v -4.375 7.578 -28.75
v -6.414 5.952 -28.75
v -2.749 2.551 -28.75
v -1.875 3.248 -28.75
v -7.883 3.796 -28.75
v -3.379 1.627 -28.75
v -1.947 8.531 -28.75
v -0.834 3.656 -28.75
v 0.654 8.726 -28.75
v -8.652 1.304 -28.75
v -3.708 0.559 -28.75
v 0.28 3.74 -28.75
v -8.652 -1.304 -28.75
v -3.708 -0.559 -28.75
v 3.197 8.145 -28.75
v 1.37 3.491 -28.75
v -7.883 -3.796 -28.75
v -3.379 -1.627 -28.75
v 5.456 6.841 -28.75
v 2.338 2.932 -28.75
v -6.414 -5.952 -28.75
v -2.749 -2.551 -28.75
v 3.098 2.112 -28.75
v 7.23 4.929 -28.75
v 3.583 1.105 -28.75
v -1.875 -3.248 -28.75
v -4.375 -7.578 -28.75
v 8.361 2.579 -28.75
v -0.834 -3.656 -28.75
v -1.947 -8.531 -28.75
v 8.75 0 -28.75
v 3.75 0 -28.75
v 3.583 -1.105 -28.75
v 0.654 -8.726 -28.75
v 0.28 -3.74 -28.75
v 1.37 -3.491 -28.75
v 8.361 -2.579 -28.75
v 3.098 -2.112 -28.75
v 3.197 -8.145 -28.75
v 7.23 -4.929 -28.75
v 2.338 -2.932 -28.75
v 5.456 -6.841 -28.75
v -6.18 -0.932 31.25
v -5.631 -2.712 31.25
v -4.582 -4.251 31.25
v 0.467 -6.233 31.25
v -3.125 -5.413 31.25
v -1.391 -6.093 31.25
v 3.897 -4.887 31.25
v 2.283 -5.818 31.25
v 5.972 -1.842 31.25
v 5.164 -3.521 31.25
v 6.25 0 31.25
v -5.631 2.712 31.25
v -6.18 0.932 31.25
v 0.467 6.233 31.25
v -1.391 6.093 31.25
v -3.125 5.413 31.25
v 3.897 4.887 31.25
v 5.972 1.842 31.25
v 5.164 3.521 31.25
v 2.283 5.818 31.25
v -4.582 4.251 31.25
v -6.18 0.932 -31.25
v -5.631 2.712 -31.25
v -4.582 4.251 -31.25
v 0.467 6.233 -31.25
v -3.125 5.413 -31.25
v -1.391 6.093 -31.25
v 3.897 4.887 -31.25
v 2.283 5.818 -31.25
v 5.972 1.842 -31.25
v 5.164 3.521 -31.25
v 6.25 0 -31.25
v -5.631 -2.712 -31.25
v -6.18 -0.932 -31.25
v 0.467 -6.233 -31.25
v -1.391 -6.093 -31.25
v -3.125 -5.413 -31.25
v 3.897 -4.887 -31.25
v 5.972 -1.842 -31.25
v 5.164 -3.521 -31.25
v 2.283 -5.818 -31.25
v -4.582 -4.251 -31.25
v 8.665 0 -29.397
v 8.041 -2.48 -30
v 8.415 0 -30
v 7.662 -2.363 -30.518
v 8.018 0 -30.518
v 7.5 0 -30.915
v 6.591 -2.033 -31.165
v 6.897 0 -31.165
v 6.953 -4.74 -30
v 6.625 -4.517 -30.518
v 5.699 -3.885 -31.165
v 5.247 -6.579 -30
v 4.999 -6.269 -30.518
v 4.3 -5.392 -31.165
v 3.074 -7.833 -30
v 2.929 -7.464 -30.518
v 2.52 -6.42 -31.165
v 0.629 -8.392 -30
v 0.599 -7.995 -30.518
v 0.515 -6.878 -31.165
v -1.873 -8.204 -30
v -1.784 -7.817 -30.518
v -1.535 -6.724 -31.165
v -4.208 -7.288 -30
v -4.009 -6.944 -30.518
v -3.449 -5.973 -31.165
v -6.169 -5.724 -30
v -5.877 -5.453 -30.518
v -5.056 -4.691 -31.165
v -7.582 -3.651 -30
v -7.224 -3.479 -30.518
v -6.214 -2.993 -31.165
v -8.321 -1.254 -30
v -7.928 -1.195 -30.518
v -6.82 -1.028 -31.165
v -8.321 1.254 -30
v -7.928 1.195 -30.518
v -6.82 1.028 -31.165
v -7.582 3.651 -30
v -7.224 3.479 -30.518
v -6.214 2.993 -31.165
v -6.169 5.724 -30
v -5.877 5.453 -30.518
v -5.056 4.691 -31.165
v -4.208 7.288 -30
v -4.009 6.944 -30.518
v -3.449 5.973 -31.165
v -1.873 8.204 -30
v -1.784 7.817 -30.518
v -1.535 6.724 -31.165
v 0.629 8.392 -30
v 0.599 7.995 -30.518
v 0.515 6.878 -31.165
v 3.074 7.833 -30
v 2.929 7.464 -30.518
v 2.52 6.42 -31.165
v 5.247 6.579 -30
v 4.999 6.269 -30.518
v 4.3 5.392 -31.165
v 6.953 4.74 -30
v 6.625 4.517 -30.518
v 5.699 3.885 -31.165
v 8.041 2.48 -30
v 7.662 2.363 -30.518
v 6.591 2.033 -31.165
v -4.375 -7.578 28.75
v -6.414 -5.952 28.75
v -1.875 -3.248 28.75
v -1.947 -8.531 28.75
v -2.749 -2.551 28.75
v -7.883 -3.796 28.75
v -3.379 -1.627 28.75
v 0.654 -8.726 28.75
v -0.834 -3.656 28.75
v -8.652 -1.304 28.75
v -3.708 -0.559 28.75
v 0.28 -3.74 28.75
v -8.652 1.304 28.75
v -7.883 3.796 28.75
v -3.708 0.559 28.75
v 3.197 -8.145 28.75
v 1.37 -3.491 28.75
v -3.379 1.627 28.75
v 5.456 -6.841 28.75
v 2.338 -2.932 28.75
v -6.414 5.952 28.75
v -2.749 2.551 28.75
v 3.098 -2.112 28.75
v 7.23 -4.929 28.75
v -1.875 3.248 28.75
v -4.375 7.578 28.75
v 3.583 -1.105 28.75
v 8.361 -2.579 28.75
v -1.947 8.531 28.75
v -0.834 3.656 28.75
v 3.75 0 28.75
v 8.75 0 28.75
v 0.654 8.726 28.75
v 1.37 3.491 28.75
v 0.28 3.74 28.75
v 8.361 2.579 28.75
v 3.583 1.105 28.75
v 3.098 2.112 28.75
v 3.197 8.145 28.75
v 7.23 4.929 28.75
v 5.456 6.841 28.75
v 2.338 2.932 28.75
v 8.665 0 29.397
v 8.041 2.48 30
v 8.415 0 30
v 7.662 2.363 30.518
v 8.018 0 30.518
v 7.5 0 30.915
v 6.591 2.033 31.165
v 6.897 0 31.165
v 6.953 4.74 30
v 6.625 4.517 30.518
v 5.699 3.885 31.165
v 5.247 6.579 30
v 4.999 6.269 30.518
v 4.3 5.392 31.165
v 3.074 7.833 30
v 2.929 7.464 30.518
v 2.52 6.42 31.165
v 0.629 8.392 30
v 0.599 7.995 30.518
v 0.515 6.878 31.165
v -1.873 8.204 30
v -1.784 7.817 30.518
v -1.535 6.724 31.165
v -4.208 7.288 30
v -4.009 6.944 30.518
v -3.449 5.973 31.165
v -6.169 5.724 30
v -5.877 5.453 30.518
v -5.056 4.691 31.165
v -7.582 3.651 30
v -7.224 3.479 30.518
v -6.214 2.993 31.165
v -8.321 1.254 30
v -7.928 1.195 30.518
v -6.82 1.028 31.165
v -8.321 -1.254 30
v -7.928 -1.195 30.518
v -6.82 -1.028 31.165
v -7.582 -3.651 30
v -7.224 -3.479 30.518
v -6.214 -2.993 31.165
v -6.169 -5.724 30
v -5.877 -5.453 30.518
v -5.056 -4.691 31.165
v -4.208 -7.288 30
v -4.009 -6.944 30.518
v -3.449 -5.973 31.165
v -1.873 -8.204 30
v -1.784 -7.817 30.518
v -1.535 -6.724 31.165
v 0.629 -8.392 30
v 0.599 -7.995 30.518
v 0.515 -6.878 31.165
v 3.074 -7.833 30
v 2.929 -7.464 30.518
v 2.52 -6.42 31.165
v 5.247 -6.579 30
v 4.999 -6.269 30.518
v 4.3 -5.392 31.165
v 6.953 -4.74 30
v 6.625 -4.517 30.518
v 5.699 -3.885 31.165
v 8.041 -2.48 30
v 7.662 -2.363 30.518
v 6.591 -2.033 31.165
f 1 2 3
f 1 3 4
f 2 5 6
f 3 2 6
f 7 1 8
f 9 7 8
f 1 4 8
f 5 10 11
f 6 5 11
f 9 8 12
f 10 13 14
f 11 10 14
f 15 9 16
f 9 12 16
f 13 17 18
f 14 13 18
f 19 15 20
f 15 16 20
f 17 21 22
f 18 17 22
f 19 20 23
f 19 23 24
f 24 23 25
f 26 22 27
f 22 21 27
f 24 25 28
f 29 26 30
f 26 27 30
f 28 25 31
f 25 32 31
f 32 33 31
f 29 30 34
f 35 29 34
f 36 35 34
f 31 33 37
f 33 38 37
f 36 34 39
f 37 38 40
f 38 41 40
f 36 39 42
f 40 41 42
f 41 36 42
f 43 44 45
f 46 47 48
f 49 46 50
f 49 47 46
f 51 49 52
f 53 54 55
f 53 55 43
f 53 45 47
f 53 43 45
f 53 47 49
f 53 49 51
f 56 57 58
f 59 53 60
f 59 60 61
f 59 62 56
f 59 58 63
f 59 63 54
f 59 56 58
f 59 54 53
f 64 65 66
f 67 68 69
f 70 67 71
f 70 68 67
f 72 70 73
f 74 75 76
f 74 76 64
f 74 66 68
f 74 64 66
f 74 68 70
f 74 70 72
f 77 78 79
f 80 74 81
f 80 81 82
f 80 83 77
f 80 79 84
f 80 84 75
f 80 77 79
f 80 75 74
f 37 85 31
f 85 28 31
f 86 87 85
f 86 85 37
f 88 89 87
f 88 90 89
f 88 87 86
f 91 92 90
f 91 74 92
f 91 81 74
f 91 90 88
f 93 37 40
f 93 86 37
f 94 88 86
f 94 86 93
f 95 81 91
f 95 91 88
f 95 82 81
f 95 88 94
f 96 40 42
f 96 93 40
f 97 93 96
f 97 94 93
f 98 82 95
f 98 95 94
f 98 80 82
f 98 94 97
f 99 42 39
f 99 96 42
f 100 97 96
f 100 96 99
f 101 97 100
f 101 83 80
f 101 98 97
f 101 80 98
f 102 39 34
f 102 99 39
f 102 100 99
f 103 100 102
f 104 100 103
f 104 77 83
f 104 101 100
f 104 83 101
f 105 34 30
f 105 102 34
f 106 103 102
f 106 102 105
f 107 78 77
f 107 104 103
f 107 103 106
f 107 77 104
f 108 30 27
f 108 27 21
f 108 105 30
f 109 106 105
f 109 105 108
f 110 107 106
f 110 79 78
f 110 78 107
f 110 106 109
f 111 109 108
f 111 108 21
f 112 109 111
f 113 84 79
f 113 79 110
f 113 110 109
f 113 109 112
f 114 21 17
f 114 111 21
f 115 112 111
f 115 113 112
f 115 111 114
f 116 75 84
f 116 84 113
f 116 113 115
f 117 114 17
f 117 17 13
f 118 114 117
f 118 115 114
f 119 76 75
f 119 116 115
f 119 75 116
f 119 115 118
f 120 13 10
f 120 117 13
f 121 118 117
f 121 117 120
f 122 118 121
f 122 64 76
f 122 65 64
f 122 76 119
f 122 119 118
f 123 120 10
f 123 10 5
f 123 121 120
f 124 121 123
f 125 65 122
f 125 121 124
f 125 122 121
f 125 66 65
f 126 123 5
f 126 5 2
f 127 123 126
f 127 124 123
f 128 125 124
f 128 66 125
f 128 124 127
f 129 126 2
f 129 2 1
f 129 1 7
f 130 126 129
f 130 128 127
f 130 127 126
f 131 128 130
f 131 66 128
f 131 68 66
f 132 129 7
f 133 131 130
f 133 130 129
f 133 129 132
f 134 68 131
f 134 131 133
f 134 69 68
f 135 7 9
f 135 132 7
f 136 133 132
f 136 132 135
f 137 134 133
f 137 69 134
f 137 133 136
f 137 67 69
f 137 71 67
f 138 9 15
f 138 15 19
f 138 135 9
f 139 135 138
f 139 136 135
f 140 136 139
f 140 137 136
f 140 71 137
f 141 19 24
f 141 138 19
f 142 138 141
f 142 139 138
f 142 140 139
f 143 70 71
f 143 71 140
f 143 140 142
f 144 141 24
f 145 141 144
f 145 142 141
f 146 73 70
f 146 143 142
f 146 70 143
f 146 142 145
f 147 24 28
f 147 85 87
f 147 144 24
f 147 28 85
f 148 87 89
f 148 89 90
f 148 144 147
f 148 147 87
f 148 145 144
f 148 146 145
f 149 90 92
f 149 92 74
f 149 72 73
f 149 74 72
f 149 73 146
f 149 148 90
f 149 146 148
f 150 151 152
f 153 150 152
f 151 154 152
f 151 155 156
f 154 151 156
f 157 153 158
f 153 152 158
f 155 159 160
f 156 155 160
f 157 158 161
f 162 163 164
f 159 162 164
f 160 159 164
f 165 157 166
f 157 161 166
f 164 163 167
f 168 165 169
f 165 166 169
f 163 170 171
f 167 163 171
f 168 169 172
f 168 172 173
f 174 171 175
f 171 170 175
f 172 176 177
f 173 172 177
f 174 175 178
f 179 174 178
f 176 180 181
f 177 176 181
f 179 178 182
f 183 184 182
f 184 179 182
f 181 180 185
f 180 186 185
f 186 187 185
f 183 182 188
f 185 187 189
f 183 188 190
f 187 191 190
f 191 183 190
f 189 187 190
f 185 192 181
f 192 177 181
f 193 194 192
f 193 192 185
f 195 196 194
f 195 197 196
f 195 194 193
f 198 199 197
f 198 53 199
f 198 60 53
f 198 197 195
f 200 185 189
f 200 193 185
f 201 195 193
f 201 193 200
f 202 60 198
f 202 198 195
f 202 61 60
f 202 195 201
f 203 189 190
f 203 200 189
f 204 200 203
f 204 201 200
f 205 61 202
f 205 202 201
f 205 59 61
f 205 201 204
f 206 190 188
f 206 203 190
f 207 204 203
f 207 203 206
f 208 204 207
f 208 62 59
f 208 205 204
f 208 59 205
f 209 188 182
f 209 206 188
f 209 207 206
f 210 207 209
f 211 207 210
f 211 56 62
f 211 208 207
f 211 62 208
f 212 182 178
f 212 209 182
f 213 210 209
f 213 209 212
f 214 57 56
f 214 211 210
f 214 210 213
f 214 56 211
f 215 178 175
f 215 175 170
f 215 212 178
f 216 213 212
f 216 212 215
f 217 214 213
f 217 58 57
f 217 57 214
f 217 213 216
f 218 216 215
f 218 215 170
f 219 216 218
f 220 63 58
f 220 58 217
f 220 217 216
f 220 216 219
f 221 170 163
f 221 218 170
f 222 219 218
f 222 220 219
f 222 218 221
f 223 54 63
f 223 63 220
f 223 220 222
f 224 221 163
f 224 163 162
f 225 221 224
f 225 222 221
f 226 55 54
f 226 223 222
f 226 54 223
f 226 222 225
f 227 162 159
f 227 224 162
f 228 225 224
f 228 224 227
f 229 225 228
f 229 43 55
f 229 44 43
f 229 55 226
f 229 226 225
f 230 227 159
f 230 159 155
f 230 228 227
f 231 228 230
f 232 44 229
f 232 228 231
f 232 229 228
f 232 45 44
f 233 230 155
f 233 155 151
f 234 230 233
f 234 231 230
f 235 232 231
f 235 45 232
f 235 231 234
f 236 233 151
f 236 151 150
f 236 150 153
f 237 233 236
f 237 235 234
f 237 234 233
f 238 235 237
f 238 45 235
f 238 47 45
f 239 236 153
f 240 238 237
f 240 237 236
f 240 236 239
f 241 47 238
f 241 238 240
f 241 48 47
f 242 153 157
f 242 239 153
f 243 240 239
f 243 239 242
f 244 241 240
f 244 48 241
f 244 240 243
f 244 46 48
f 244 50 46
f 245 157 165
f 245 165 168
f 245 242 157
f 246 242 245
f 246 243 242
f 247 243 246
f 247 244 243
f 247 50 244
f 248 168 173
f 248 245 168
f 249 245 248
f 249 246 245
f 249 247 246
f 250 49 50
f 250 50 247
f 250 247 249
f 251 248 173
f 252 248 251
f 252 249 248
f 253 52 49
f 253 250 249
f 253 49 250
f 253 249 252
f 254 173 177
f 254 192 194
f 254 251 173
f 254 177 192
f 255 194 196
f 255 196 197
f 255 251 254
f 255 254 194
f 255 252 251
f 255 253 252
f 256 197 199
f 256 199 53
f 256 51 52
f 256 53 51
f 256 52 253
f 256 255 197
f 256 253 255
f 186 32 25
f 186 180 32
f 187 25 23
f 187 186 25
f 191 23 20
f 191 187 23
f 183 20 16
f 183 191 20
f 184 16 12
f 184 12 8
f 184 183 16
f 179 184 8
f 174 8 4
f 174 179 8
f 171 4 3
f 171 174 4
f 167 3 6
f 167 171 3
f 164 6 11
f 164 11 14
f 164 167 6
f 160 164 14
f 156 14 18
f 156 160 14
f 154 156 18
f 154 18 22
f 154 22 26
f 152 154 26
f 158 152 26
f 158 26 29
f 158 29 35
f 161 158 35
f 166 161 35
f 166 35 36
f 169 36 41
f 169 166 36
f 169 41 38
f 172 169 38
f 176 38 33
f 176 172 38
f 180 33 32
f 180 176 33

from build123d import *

# Parameters (mm, degrees)
SKETCH1_R           = 3.75
BOSS_EXTRUDE1_DEPTH = 28.75
BOSS_EXTRUDE2_START = 2.5
SKETCH2_R           = 8.75
SKETCH2_R_2         = 3.75
BOSS_EXTRUDE2_DEPTH = 2.5
SKETCH3_R           = 8.75
BOSS_EXTRUDE3_DEPTH = 2.5
FILLET1_R           = 2.5


with BuildPart() as part:
    # Sketch1 → Boss-Extrude1 (new, symmetric)
    with BuildSketch(Plane.XY):
        Circle(SKETCH1_R)
    extrude(amount=BOSS_EXTRUDE1_DEPTH, both=True)

    # Sketch2 → Boss-Extrude2 (add)
    # profile 1 of 2: a face of its own
    with BuildSketch(Plane.XY.offset(28.75).offset(BOSS_EXTRUDE2_START)):
        Circle(SKETCH2_R)
        Circle(SKETCH2_R_2, mode=Mode.SUBTRACT)
    # profile 2 of 2: a face of its own
    with BuildSketch(Plane.XY.offset(28.75).offset(BOSS_EXTRUDE2_START)):
        Circle(SKETCH2_R_2)
    extrude(amount=-BOSS_EXTRUDE2_DEPTH)

    # Sketch3 → Boss-Extrude3 (add)
    with BuildSketch(Plane(origin=(0, 0, -28.75), x_dir=(-1, 0, 0), z_dir=(0, 0, -1))):
        with Locations(Location((0, 0, 0), (0, 0, 180))):
            Circle(SKETCH3_R)
    extrude(amount=BOSS_EXTRUDE3_DEPTH)

    # Fillet1
    fillet1_edges = [part.edges().sort_by_distance(p)[0] for p in [
        (-8.75, 0, -31.25),
        (-8.75, 0, 31.25),
    ]]
    fillet(fillet1_edges, radius=FILLET1_R - 0.0001)  # a hair under: the kernel refuses the full size


solid = part.part
